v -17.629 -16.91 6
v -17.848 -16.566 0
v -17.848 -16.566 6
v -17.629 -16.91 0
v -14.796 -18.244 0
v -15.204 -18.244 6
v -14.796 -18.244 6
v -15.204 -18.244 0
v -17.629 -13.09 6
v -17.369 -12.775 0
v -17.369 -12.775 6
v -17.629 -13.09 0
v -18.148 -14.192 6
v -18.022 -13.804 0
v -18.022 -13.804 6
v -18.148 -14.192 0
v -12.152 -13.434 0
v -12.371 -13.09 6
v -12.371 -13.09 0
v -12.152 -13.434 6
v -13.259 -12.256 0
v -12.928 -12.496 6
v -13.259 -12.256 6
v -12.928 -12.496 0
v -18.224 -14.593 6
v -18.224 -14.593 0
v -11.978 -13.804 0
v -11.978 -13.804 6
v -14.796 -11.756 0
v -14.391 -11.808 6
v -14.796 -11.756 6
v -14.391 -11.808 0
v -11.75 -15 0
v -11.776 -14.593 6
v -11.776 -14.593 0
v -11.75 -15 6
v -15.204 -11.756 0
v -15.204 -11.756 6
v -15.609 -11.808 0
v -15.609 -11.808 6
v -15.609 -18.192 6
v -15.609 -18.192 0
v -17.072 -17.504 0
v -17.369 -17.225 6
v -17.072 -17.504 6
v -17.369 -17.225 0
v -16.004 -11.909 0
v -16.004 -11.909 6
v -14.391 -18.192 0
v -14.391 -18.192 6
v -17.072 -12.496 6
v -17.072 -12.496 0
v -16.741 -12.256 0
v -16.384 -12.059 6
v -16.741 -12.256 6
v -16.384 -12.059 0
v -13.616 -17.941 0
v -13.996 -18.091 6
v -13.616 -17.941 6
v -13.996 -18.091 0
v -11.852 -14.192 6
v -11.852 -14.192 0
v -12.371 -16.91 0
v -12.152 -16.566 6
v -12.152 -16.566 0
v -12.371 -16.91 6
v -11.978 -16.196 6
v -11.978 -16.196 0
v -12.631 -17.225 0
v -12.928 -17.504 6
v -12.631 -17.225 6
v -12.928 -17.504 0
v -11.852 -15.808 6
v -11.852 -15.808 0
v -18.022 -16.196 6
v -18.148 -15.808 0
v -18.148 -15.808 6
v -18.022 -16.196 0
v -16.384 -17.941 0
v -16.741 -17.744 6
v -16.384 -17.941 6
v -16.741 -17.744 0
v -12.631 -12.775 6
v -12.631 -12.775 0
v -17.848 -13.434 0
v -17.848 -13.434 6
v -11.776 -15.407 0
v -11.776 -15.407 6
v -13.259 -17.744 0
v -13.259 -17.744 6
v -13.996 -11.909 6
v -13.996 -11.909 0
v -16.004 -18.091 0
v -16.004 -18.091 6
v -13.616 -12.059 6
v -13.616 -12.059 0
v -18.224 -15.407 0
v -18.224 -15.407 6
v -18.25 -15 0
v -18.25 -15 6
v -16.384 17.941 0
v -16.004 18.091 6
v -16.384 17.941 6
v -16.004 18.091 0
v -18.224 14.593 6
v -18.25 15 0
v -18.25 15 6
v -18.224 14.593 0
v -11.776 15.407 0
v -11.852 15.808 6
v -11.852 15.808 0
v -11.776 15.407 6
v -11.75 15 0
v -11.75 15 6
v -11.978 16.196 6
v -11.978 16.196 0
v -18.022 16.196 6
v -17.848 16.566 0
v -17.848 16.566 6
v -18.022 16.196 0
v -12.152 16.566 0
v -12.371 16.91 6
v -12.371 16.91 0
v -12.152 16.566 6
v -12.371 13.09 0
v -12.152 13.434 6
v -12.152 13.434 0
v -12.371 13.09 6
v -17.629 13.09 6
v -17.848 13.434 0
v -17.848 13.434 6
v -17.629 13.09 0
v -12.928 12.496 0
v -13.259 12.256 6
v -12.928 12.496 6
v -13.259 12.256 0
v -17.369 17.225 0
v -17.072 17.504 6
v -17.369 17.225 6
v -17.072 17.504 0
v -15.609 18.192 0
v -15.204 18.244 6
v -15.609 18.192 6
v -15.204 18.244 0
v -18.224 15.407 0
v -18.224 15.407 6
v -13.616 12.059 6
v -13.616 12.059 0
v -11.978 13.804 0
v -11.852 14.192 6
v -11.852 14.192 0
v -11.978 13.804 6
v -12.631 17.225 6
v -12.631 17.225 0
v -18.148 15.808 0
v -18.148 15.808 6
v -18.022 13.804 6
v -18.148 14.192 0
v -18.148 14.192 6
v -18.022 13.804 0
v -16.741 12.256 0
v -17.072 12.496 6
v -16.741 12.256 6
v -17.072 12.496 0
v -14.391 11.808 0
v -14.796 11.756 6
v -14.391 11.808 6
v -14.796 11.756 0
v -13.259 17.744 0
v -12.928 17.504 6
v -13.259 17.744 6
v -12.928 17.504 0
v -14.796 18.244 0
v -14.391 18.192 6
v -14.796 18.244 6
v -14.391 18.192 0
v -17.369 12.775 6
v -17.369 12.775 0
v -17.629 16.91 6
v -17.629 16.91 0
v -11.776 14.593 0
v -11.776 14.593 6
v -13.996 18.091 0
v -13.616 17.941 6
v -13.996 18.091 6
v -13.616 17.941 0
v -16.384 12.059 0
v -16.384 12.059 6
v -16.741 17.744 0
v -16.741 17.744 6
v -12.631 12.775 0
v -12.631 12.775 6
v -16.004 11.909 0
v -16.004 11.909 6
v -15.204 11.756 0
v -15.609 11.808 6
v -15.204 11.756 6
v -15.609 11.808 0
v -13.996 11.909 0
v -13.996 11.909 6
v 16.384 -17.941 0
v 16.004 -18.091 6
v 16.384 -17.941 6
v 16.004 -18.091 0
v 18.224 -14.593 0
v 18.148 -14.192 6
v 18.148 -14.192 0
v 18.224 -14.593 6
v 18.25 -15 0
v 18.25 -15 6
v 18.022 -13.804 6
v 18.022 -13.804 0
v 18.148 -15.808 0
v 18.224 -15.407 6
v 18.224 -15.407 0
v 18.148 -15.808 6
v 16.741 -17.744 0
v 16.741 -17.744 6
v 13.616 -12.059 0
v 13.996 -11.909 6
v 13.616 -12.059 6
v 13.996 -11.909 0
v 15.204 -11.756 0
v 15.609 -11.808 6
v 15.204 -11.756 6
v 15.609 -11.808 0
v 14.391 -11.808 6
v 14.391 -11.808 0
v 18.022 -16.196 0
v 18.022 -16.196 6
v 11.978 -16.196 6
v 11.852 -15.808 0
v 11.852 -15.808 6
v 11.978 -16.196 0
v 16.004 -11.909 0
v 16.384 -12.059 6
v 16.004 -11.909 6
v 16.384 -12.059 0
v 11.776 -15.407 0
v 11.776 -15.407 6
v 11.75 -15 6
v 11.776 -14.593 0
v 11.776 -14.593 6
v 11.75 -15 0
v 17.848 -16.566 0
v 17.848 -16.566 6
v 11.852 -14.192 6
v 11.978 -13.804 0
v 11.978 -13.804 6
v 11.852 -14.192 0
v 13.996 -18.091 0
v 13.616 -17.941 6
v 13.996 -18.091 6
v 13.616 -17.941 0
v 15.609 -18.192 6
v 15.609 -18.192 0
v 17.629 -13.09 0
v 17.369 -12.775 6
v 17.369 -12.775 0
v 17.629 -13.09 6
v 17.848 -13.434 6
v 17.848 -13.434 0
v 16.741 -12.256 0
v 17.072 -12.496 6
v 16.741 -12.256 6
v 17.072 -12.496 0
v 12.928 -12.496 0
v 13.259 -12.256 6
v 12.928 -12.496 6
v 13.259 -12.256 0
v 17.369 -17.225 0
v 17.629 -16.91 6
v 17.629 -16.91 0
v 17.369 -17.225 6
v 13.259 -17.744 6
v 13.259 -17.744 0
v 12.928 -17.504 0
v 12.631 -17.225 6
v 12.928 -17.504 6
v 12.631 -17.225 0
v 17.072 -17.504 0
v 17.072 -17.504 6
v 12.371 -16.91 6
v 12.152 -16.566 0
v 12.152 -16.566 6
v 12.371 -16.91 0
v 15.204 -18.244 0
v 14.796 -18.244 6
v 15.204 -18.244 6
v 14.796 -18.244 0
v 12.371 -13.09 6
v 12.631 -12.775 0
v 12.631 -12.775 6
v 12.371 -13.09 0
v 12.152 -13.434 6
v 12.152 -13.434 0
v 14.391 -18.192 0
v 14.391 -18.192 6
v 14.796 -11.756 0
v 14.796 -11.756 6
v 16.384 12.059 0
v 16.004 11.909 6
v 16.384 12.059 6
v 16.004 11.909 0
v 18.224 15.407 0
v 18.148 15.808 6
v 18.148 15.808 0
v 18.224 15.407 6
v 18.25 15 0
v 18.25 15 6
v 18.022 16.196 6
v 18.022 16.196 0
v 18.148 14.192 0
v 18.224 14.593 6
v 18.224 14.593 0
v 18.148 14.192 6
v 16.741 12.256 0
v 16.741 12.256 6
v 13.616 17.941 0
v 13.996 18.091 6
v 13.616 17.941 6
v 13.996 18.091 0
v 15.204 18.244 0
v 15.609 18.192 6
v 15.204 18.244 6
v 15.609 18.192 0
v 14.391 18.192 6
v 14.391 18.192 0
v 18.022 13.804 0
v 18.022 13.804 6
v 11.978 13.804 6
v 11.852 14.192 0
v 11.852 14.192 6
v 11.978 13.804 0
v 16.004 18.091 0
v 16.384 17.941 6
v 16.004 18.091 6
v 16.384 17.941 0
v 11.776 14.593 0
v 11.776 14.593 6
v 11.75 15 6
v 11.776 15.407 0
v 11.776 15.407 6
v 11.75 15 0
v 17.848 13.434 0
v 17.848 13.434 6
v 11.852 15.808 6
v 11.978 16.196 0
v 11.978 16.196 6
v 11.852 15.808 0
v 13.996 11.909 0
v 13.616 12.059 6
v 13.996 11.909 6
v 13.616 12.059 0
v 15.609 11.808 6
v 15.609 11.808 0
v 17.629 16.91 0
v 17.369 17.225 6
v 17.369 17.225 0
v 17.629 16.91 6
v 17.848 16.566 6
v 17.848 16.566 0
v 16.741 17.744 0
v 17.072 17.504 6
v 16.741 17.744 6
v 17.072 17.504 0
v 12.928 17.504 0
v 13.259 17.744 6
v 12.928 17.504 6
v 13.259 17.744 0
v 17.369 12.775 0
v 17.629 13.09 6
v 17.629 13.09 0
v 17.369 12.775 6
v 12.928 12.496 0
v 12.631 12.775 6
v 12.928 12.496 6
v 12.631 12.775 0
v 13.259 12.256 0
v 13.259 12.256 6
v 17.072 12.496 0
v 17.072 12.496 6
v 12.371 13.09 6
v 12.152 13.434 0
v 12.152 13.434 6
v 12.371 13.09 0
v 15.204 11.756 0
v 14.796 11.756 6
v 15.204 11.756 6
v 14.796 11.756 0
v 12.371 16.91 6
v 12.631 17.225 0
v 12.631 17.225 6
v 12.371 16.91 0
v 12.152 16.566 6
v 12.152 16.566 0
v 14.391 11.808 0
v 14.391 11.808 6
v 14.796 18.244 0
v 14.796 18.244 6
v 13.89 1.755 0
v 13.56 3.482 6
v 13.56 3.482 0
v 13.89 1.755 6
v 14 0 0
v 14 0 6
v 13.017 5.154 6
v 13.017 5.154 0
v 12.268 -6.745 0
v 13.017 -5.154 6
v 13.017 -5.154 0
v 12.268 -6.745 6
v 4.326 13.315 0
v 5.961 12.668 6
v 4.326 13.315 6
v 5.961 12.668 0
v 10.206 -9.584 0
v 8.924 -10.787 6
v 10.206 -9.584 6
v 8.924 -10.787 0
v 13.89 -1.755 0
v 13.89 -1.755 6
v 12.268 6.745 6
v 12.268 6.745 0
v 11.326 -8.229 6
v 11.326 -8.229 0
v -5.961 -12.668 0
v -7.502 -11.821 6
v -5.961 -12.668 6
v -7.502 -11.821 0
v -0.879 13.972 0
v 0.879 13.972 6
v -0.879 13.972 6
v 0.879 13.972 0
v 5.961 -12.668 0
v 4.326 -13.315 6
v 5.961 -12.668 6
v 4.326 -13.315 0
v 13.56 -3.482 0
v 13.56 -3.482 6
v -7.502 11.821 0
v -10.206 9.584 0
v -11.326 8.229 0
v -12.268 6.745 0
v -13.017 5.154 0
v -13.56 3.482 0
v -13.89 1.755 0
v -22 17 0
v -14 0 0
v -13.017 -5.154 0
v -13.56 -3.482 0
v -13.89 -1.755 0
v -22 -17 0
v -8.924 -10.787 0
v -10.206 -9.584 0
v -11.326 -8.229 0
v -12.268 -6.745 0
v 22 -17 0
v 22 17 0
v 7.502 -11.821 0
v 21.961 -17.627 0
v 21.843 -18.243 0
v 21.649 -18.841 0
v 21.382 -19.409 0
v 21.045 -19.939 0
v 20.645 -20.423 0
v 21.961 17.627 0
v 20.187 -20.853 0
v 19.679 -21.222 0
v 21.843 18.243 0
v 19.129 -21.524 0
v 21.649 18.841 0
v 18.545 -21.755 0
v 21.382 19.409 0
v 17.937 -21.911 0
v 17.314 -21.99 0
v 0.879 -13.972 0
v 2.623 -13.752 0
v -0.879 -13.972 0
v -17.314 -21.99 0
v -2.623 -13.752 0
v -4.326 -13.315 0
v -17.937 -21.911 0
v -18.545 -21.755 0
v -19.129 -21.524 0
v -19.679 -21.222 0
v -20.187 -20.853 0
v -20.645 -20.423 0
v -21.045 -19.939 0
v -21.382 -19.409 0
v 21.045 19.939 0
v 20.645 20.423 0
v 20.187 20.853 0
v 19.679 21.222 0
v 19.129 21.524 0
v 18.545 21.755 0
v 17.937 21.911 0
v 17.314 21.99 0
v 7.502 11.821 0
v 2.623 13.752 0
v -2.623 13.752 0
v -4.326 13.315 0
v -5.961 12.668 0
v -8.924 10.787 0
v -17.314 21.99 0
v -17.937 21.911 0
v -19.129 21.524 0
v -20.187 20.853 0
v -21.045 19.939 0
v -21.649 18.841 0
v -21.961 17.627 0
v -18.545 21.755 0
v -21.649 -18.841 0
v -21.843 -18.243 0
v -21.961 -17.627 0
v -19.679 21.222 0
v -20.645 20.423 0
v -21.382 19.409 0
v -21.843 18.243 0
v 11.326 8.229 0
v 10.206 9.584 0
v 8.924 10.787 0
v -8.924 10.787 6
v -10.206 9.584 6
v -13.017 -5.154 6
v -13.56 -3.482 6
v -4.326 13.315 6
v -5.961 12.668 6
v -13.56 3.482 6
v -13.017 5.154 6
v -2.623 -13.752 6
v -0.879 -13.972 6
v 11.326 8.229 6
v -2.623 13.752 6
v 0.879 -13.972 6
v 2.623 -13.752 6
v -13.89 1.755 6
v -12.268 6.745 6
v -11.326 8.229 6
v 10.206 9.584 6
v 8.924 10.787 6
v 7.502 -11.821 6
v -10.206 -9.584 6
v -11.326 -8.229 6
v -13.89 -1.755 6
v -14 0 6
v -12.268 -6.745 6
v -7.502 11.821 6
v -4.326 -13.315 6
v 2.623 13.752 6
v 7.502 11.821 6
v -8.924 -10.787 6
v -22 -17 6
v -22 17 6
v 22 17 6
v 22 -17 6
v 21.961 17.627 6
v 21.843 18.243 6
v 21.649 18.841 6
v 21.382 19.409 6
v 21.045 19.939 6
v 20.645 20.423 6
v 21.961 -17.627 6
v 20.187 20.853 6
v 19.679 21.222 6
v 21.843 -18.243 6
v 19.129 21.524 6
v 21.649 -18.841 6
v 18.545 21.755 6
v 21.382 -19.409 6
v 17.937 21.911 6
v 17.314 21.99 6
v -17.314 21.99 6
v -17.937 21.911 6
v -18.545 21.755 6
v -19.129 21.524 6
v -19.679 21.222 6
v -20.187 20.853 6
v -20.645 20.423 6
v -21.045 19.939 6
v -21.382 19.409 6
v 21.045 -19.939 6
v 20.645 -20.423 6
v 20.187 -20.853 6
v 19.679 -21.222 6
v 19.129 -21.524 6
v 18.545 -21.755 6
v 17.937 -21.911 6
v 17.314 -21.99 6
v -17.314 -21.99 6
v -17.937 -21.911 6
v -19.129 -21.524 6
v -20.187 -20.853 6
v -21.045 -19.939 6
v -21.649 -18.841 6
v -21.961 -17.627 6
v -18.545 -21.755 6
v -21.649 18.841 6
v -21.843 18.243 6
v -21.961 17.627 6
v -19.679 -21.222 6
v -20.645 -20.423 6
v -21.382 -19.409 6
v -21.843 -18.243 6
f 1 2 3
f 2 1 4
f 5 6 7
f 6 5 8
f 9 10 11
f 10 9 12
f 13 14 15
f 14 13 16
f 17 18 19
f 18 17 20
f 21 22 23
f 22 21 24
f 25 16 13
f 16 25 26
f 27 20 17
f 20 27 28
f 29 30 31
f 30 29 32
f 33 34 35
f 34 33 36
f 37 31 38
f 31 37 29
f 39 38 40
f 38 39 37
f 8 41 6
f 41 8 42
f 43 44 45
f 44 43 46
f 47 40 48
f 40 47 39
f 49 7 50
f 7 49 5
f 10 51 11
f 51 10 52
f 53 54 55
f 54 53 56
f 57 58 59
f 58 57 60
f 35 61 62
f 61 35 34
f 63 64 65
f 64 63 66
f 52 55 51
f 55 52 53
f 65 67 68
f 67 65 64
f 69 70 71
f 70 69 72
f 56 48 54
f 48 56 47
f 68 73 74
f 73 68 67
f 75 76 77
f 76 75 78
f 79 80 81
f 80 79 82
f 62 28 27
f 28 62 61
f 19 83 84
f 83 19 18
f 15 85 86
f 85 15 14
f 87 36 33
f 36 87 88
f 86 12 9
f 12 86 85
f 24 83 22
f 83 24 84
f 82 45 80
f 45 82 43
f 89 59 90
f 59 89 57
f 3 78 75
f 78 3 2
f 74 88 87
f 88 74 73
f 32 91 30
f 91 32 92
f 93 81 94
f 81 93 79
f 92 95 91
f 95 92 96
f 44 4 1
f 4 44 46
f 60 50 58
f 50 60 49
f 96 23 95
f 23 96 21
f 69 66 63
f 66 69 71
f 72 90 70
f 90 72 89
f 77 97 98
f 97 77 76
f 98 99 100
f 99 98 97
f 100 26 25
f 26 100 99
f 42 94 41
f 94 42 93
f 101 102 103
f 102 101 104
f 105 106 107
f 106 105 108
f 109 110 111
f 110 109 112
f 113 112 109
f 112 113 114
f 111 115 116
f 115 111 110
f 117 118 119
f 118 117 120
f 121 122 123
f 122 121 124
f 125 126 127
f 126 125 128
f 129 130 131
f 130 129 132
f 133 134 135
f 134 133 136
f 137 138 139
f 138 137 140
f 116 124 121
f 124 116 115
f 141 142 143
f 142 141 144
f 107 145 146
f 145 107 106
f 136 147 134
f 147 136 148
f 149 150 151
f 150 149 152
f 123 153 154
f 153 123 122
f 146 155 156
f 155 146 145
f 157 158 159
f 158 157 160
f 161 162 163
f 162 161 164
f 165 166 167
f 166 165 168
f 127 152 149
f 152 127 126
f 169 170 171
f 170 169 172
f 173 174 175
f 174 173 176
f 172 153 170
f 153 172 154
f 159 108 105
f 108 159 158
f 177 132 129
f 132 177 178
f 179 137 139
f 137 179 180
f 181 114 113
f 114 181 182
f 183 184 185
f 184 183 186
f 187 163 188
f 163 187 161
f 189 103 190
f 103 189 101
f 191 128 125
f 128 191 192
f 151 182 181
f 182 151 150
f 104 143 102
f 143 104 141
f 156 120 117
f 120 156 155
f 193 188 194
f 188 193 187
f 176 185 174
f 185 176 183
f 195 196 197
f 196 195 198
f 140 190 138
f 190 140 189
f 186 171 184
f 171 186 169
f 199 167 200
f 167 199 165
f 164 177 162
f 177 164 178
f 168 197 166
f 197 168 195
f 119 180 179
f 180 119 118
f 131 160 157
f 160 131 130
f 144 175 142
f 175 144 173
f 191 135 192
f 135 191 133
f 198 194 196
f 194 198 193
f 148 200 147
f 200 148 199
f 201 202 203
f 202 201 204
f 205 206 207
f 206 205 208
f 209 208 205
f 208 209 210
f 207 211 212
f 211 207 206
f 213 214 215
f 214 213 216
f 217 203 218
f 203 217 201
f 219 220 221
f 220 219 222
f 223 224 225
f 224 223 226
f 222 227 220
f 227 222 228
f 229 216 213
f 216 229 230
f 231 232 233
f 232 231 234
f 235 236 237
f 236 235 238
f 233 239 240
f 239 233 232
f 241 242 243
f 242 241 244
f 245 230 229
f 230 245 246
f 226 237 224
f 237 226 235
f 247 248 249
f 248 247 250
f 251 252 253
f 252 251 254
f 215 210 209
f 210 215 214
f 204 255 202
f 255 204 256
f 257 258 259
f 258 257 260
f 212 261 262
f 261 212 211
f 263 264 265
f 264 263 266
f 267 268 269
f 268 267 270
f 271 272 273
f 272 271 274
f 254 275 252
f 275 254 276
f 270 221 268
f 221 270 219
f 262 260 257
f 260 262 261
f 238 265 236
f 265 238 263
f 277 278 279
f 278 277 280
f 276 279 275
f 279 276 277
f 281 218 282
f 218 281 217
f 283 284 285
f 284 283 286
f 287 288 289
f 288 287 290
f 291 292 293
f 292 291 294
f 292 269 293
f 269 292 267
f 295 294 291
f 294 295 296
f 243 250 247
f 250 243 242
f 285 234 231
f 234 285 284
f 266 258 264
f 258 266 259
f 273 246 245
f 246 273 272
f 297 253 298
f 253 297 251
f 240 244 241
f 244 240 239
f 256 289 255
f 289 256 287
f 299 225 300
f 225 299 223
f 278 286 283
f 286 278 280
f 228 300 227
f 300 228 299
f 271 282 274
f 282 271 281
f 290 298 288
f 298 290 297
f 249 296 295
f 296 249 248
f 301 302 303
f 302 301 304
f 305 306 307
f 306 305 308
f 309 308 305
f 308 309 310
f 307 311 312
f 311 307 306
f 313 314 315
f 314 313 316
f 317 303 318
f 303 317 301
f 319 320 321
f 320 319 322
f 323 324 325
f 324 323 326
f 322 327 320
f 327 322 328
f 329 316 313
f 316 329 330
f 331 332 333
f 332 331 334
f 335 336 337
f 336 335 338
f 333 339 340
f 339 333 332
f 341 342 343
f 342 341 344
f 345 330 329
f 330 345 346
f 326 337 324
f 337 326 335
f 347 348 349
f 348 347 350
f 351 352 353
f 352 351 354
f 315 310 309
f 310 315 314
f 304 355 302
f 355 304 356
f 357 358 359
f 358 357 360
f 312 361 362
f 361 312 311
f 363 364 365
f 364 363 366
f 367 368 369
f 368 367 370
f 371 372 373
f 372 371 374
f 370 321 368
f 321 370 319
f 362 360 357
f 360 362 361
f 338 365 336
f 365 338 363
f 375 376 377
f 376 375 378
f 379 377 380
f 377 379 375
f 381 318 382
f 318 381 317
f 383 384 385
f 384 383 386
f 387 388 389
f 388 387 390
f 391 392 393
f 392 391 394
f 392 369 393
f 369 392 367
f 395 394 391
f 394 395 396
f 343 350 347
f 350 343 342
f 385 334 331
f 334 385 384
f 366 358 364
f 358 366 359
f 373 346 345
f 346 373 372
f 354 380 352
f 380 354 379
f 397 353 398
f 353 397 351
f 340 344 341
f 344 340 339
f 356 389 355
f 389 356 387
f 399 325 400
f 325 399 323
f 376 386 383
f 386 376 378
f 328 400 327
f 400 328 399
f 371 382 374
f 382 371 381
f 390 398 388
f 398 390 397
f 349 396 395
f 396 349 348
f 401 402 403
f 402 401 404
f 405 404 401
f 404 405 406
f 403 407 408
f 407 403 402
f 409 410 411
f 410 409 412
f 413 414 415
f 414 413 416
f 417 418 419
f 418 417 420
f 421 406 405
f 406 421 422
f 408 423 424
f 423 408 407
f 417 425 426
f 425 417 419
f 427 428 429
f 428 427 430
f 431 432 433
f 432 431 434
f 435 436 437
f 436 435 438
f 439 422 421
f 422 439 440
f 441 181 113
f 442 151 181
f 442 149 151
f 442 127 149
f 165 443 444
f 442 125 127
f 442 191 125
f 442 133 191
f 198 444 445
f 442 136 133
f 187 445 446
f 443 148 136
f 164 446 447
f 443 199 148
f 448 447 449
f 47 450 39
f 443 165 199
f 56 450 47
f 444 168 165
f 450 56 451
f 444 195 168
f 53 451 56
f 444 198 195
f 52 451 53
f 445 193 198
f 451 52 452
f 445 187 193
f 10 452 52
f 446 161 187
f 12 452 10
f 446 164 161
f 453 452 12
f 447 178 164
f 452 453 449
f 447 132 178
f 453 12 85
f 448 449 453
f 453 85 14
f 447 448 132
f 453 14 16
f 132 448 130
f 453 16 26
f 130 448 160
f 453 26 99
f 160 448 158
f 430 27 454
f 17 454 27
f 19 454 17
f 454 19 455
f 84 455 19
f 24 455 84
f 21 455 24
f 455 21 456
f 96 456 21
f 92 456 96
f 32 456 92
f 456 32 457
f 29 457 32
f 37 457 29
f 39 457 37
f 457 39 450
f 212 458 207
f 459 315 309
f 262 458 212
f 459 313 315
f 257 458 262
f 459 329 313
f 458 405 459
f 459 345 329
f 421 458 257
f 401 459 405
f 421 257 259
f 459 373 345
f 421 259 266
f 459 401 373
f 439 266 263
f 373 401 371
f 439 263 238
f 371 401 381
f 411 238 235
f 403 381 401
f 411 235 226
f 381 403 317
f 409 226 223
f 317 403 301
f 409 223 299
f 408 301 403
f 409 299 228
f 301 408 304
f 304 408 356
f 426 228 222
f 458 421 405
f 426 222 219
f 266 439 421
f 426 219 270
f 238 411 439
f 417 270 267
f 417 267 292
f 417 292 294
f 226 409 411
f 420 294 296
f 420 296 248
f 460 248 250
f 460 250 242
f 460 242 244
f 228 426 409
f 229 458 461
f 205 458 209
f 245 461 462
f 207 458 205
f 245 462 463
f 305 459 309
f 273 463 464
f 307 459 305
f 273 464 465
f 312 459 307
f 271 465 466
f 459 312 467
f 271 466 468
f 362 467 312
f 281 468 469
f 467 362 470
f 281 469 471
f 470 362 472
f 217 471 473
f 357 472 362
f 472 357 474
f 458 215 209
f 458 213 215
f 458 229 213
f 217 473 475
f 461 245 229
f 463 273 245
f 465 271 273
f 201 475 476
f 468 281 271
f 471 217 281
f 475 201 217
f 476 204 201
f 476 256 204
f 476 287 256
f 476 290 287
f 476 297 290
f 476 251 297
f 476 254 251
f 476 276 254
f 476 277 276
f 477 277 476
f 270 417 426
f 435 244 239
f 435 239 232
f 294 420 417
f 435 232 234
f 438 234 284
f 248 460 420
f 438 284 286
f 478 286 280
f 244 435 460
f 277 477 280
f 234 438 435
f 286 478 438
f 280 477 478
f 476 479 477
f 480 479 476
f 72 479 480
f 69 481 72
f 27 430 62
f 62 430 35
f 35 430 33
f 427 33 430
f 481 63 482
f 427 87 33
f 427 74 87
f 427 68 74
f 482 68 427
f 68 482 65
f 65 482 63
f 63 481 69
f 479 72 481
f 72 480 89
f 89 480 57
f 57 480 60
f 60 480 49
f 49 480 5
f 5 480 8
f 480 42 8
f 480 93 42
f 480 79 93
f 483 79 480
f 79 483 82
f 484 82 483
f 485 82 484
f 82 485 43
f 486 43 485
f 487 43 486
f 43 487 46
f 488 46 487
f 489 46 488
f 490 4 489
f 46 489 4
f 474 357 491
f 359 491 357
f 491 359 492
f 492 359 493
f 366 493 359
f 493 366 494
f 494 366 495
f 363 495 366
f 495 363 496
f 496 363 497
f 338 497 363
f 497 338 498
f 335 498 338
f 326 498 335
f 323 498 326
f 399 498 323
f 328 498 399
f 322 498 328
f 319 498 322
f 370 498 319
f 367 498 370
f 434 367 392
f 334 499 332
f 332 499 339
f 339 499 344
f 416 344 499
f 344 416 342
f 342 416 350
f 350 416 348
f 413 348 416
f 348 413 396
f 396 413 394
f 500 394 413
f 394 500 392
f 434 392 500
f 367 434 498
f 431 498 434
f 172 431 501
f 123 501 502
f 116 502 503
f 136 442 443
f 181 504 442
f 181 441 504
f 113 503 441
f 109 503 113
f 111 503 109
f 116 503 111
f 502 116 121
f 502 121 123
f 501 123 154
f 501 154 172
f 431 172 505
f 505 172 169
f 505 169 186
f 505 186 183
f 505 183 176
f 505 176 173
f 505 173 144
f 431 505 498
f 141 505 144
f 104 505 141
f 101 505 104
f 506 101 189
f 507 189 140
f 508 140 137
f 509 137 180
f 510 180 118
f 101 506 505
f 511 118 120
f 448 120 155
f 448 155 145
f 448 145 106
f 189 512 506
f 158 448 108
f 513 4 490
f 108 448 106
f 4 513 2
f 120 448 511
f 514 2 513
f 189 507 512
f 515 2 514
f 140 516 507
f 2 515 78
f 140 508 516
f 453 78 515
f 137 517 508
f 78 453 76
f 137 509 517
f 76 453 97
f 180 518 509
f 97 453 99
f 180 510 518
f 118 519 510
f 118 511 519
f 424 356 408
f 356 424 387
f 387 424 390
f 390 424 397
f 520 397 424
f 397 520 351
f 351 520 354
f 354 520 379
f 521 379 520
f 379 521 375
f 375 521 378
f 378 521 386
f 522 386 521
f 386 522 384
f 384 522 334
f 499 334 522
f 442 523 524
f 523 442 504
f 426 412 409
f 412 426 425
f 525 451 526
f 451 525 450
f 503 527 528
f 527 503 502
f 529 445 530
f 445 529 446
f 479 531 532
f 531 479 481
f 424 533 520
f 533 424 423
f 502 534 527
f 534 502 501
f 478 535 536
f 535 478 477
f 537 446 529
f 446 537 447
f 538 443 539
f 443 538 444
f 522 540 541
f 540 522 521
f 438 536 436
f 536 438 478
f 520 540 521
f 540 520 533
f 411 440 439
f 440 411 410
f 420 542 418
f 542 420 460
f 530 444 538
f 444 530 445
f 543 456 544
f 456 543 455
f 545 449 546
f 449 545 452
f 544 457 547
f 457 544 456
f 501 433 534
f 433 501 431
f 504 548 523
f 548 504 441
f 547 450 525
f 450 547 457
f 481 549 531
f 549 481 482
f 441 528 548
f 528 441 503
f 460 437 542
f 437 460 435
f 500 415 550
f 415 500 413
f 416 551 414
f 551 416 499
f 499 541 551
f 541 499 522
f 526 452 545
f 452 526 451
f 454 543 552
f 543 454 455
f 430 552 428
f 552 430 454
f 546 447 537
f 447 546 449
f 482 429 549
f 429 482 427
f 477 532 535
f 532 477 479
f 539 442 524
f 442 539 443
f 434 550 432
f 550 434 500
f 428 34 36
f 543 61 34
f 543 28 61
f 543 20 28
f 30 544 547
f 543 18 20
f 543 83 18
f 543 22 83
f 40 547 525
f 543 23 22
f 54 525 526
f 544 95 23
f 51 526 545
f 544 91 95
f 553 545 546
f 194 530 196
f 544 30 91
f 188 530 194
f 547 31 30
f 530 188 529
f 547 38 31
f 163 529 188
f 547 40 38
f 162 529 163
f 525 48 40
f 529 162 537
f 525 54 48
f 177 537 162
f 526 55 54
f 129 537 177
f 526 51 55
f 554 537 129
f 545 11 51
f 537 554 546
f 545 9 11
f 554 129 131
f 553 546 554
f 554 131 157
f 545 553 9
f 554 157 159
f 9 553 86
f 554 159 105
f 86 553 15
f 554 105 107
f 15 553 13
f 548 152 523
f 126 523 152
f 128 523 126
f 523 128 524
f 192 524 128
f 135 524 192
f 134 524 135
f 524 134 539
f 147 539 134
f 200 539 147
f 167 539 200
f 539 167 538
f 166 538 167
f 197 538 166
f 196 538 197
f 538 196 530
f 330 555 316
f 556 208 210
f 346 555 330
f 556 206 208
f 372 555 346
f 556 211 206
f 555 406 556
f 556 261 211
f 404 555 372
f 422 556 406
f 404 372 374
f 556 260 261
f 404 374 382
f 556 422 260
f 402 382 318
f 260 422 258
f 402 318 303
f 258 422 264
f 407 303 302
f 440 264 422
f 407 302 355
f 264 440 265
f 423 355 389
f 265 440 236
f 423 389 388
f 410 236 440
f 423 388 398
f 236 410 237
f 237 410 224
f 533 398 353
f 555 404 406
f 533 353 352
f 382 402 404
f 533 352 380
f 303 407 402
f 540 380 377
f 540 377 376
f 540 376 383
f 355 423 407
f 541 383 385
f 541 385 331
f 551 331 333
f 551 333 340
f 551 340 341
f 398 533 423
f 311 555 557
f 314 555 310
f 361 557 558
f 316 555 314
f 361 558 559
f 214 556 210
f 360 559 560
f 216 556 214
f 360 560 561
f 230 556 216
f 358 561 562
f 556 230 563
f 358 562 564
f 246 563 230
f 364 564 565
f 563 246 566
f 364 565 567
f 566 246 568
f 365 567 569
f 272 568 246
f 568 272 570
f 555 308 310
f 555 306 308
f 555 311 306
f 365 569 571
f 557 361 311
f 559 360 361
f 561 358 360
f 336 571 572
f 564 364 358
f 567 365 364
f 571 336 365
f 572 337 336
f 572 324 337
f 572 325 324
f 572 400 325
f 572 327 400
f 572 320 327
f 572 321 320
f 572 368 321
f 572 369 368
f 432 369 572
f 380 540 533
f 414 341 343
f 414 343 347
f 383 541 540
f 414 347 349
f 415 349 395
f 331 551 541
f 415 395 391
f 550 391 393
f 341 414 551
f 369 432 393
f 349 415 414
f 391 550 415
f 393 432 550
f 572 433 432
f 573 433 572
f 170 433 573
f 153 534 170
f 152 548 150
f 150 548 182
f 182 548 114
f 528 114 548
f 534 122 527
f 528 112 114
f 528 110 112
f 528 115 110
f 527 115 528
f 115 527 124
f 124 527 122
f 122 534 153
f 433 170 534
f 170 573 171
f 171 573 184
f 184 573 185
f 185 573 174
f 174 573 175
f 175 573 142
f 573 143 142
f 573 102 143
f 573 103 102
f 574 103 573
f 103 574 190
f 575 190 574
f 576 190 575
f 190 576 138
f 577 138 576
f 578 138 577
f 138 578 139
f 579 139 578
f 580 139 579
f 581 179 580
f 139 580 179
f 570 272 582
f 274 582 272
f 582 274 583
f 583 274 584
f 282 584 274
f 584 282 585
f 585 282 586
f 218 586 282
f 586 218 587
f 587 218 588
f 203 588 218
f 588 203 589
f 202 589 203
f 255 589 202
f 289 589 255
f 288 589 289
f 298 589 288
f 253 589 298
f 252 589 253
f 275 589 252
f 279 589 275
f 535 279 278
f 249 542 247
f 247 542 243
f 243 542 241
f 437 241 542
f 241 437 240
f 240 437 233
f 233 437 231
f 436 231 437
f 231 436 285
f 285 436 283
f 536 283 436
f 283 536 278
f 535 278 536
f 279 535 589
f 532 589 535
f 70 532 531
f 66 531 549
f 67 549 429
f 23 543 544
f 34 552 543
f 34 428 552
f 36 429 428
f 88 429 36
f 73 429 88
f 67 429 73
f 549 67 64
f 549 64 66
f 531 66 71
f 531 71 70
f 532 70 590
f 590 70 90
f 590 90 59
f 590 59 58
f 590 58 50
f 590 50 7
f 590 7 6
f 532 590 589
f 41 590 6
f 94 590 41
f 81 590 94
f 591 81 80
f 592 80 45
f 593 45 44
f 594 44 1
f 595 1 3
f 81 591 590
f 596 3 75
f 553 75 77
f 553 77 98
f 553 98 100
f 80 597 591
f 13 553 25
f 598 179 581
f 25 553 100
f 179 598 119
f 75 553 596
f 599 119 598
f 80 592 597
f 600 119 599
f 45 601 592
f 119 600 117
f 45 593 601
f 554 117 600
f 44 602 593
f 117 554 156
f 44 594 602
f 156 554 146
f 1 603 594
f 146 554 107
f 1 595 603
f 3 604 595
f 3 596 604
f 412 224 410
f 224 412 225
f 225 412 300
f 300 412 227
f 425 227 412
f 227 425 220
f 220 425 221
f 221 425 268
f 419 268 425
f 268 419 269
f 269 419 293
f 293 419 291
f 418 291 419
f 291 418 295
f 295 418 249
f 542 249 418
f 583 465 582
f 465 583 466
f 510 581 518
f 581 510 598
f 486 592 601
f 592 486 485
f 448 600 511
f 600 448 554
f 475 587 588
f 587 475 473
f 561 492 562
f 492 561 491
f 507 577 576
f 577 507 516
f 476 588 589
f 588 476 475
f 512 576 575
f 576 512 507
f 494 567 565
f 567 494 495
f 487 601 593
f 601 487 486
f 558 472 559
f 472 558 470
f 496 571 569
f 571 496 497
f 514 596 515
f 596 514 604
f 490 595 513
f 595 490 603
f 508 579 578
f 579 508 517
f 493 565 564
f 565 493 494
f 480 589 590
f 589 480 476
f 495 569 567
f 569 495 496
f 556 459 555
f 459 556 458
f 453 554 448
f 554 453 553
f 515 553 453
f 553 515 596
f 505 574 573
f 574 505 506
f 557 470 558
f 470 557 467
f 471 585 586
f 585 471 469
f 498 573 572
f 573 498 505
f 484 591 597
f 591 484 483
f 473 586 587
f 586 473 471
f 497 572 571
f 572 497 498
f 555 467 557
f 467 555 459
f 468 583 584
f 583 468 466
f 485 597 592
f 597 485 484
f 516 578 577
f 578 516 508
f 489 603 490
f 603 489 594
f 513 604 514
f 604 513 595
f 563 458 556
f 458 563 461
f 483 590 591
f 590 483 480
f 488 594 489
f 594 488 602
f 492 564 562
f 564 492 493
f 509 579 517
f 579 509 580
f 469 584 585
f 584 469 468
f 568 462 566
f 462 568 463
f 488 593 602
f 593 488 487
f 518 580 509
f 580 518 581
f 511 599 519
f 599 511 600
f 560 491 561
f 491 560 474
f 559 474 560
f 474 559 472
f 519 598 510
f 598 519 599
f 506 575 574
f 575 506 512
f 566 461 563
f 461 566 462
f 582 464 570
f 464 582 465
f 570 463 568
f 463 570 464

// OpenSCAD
$fn = 50;


difference() {
	union() {
		hull() {
			translate(v = [-17.0000000000, 17.0000000000, 0]) {
				cylinder(h = 6, r = 5);
			}
			translate(v = [17.0000000000, 17.0000000000, 0]) {
				cylinder(h = 6, r = 5);
			}
			translate(v = [-17.0000000000, -17.0000000000, 0]) {
				cylinder(h = 6, r = 5);
			}
			translate(v = [17.0000000000, -17.0000000000, 0]) {
				cylinder(h = 6, r = 5);
			}
		}
	}
	union() {
		#translate(v = [-15.0000000000, -15.0000000000, -100.0000000000]) {
			cylinder(h = 200, r = 3.2500000000);
		}
		#translate(v = [-15.0000000000, 15.0000000000, -100.0000000000]) {
			cylinder(h = 200, r = 3.2500000000);
		}
		#translate(v = [15.0000000000, -15.0000000000, -100.0000000000]) {
			cylinder(h = 200, r = 3.2500000000);
		}
		#translate(v = [15.0000000000, 15.0000000000, -100.0000000000]) {
			cylinder(h = 200, r = 3.2500000000);
		}
		#cylinder(h = 6, r = 14.0000000000);
	}
}
